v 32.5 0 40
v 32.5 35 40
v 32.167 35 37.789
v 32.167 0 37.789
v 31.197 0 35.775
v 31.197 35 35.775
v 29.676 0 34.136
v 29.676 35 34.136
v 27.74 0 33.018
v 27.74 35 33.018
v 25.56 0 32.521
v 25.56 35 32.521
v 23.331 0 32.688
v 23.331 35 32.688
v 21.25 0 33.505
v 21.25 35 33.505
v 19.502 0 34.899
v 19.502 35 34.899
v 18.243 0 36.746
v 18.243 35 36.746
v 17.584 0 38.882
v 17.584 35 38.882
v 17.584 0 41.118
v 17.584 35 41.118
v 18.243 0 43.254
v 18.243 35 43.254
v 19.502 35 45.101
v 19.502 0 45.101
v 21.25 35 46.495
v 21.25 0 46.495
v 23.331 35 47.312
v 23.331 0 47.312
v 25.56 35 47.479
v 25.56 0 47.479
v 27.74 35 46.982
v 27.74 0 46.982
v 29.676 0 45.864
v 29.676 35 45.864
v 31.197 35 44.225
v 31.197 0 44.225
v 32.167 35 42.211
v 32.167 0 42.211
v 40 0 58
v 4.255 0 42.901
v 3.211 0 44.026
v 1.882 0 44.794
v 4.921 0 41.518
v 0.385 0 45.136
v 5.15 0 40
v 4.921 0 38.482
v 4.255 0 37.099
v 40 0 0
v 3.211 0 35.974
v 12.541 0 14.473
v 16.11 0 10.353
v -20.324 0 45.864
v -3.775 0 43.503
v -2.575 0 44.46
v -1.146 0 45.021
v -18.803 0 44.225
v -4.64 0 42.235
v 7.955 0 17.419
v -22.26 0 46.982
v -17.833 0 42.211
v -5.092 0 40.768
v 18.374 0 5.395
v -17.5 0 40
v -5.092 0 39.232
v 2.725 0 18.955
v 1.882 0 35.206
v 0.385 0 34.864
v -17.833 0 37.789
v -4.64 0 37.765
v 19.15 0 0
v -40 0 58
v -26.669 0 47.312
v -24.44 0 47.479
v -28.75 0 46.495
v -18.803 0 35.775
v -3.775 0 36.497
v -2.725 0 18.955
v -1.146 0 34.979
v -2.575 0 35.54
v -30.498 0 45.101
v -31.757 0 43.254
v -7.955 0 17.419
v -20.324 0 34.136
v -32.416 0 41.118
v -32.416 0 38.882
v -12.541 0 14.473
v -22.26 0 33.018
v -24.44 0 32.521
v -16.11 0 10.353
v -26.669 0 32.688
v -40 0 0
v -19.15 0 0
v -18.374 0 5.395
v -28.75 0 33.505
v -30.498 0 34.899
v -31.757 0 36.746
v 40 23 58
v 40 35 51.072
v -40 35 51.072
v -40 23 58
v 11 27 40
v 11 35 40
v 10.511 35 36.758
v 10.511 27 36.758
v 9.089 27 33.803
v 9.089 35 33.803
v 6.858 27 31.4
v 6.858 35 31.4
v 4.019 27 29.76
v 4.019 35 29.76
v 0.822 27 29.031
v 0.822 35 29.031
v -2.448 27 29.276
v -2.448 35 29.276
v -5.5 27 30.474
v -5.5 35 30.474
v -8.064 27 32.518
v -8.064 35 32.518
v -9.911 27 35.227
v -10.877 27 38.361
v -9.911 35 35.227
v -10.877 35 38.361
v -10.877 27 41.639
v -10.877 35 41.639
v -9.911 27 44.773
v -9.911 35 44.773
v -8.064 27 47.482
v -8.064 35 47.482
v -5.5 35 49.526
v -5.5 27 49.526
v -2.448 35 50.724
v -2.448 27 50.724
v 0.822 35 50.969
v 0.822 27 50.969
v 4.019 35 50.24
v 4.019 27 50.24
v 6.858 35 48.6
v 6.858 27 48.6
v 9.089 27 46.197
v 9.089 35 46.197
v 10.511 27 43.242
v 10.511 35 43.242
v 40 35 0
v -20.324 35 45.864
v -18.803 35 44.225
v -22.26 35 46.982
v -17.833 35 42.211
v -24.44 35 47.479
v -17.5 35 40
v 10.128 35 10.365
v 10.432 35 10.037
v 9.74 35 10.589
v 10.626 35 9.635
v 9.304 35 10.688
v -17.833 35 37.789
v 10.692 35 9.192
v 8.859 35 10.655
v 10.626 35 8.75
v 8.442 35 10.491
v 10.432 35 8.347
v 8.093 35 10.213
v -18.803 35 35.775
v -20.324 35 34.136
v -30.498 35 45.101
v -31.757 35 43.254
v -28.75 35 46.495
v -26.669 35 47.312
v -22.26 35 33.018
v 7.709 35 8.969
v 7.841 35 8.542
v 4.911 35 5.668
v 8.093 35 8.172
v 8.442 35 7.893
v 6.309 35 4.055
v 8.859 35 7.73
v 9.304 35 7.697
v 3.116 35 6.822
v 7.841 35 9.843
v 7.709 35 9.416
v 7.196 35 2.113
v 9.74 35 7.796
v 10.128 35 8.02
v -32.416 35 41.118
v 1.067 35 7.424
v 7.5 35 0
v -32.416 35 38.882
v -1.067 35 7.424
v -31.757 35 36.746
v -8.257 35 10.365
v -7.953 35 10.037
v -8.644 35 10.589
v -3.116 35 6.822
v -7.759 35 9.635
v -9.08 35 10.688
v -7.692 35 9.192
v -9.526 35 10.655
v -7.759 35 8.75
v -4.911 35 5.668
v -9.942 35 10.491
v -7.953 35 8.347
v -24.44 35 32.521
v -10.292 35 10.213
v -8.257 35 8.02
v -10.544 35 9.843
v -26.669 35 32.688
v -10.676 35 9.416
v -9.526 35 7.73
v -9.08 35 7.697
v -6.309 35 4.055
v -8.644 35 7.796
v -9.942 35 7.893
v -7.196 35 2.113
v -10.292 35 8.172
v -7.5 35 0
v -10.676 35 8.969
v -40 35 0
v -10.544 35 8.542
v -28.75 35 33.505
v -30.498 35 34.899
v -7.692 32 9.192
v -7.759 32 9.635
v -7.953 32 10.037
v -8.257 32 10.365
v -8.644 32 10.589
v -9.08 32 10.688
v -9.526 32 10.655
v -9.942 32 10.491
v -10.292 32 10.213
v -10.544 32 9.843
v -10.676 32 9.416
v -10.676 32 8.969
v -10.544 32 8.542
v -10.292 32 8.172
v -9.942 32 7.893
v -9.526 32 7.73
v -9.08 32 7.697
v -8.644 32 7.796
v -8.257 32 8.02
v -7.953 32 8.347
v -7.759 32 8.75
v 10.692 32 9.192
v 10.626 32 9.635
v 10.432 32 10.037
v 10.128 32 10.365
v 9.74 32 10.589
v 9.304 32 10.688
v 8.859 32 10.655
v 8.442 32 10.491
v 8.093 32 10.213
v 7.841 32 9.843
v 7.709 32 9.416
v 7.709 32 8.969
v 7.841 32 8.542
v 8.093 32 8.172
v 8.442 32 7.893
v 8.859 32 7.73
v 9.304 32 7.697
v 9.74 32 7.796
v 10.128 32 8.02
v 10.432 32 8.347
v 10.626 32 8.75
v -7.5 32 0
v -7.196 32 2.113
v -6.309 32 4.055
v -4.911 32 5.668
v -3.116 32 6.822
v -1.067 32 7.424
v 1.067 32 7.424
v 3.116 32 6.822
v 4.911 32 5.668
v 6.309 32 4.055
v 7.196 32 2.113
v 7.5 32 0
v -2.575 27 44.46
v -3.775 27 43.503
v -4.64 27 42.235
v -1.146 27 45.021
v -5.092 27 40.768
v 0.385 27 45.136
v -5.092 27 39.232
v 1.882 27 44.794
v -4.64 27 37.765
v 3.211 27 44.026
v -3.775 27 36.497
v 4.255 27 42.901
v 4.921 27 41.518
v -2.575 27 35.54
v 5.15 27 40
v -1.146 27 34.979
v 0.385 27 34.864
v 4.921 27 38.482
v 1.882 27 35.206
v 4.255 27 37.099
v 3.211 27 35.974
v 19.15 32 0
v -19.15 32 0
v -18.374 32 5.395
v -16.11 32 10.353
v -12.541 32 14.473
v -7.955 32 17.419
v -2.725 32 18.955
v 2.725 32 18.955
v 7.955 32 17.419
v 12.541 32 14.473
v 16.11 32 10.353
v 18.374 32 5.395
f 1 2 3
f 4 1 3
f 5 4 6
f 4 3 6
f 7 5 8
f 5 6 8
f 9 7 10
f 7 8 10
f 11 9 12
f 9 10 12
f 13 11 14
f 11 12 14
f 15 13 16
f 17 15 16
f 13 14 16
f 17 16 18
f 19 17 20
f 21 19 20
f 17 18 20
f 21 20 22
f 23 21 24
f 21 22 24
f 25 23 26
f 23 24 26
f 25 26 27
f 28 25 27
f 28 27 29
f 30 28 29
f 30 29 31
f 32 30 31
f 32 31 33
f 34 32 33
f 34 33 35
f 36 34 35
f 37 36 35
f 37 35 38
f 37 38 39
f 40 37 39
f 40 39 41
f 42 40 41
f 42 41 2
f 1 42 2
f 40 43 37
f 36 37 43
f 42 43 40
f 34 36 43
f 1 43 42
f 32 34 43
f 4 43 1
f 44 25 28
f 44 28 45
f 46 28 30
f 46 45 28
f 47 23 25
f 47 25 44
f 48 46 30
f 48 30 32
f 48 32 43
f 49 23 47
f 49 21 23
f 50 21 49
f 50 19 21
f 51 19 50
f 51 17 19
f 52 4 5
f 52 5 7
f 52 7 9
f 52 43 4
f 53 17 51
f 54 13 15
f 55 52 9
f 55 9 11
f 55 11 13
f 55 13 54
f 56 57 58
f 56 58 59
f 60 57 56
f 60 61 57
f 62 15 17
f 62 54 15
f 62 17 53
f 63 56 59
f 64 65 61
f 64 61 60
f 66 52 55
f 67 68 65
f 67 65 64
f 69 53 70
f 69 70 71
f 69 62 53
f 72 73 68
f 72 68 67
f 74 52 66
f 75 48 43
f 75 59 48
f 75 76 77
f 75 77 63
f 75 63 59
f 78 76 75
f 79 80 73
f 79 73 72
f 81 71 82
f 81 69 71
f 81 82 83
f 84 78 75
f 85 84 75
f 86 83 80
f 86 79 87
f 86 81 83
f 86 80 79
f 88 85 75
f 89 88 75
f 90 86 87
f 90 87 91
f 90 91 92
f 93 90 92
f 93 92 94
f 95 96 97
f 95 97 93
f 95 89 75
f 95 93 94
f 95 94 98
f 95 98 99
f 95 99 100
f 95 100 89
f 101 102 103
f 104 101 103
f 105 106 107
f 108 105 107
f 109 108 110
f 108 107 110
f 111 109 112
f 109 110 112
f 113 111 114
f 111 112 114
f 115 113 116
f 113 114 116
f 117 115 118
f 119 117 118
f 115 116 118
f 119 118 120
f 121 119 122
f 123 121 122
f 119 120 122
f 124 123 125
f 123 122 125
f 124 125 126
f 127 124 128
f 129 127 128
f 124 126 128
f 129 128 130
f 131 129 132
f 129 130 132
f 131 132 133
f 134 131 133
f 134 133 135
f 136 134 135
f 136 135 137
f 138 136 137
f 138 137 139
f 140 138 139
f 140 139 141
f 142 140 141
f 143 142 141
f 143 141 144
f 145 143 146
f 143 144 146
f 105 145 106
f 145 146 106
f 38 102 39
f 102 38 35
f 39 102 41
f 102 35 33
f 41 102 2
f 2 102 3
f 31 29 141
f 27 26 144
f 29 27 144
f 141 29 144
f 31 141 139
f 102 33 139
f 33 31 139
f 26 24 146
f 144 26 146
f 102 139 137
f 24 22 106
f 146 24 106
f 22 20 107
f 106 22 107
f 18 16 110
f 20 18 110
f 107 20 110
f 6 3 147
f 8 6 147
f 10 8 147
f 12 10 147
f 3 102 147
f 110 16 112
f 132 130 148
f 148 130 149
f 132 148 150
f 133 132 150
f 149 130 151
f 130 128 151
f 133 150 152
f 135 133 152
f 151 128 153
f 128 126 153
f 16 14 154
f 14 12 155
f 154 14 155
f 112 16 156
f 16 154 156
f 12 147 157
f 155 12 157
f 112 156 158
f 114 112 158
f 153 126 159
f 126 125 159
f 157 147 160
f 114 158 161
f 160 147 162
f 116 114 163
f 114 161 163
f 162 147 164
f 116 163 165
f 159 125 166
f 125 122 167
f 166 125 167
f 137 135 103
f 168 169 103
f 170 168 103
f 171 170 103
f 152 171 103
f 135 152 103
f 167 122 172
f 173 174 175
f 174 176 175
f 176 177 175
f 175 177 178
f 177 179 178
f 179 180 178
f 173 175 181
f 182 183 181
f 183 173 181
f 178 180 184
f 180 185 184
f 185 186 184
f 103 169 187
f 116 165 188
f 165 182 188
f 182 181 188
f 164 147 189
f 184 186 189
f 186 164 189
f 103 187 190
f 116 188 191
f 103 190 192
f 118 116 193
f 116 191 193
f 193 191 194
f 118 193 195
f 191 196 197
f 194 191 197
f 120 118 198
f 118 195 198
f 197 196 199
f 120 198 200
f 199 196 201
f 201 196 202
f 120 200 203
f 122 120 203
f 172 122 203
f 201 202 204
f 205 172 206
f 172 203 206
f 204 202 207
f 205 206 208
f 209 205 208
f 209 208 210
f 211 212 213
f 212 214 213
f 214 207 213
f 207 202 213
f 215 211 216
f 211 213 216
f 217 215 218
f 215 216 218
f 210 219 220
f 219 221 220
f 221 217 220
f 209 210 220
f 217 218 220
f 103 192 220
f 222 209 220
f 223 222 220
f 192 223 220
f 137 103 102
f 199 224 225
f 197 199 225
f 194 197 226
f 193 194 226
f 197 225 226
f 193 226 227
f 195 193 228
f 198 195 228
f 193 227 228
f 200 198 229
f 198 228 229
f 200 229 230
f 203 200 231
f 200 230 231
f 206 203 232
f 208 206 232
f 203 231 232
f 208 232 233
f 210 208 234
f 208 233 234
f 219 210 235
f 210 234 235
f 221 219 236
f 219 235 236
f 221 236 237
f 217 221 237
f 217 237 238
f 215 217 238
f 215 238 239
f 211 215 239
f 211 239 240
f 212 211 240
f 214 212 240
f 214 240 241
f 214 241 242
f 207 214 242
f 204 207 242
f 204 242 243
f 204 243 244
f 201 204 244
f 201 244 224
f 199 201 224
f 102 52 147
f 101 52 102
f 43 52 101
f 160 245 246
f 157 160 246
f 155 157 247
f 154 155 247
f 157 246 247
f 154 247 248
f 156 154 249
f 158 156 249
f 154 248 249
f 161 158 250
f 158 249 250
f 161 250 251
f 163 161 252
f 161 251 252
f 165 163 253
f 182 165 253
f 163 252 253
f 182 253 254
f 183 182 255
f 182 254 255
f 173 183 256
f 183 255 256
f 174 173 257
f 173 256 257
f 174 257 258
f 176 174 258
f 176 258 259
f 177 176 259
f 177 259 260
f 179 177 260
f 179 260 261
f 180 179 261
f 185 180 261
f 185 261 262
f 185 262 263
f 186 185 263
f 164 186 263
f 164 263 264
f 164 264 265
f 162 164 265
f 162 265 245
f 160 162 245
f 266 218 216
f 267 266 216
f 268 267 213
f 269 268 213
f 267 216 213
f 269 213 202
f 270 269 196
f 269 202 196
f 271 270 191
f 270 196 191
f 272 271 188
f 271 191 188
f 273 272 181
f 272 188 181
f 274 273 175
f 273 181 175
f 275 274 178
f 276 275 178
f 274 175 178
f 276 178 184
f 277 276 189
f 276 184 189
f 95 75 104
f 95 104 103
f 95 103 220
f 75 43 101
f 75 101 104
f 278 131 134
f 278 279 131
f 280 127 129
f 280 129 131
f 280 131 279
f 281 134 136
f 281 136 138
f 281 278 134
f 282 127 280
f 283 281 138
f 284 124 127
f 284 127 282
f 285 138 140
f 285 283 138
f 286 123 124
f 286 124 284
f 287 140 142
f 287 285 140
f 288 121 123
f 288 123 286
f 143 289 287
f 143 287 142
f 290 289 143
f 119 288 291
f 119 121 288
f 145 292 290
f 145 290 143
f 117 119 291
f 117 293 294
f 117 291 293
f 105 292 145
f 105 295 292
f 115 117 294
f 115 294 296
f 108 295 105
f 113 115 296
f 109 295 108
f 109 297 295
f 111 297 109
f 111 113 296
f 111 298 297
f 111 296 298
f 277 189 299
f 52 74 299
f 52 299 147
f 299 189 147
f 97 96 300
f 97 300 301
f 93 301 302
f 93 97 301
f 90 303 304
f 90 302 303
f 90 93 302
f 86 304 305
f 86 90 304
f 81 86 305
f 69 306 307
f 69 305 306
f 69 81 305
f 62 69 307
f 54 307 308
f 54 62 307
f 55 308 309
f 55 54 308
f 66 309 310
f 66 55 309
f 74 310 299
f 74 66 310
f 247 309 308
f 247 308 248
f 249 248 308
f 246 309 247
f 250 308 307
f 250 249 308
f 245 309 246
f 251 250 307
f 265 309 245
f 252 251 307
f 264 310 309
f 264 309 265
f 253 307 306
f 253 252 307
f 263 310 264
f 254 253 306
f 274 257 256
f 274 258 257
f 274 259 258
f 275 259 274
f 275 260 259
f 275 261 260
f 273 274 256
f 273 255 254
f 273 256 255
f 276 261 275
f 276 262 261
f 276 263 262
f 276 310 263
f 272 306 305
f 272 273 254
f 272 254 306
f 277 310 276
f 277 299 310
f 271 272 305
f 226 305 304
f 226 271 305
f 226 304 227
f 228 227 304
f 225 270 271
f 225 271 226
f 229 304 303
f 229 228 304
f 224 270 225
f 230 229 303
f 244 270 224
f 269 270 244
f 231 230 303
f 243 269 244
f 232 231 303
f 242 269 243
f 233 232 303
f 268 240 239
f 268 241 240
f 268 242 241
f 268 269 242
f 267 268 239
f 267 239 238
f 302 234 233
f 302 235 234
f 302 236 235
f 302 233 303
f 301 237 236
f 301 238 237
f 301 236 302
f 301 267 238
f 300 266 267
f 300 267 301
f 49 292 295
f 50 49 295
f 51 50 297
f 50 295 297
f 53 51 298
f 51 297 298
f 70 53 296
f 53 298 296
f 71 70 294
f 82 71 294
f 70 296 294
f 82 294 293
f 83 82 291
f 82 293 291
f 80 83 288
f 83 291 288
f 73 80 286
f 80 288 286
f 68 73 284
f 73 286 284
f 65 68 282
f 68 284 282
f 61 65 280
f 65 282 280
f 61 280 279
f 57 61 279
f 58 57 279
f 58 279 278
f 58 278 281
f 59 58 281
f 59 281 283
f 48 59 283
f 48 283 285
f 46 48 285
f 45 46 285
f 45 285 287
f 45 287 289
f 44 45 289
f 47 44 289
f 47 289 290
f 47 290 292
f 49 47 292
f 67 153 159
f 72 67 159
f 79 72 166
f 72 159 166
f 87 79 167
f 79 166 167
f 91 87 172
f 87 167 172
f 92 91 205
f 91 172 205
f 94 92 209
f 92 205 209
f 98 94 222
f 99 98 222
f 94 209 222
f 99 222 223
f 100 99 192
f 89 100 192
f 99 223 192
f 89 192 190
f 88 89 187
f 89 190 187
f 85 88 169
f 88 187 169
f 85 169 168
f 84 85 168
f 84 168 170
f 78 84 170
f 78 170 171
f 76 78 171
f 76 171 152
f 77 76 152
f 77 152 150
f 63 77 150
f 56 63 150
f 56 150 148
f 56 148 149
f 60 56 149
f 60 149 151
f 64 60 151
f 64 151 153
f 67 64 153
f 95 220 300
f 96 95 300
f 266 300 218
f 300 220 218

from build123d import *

# Parameters (mm, degrees)
BOSS_EXTRUDE1_DEPTH = 35
SKETCH2_R           = 7.5
SKETCH2_R_2         = 5.15
CUT_EXTRUDE1_DEPTH  = 36
BOSS_EXTRUDE2_DEPTH = 3
SKETCH6_R           = 1.5
CUT_EXTRUDE3_DEPTH  = 4
CHAMFER1_SIZE       = 12
CHAMFER1_SIZE2      = 6.92820323
SKETCH7_R           = 11
CUT_EXTRUDE4_DEPTH  = 8


with BuildPart() as part:
    # Sketch1 → Boss-Extrude1 (new body)
    with BuildSketch(Plane(origin=(0, 0, 0), x_dir=(1, 0, 0), z_dir=(0, 1, 0))):
        with BuildLine():
            Line((19.15, 0), (40, 0))
            Line((40, 0), (40, -58))
            Line((40, -58), (-40, -58))
            Line((-40, -58), (-40, 0))
            Line((-40, 0), (-19.15, 0))
            ThreePointArc((-19.15, 0), (0, -19.15), (19.15, 0))
        make_face()
    extrude(amount=BOSS_EXTRUDE1_DEPTH)

    # Sketch2 → Cut-Extrude1 (cut, through all)
    with BuildSketch(Plane(origin=(0, 35, 0), x_dir=(1, 0, 0), z_dir=(0, 1, 0))):
        with Locations((-25, -40)):
            Circle(SKETCH2_R)
        with Locations((25, -40)):
            Circle(SKETCH2_R)
        with Locations((0, -40)):
            Circle(SKETCH2_R_2)
    extrude(amount=-CUT_EXTRUDE1_DEPTH, mode=Mode.SUBTRACT)

    # Sketch5 → Boss-Extrude2 (add)
    with BuildSketch(Plane(origin=(0, 35, 0), x_dir=(1, 0, 0), z_dir=(0, 1, 0))):
        with BuildLine():
            Line((-19.15, 0), (-7.5, 0))
            ThreePointArc((-7.5, 0), (0, -7.5), (7.5, 0))
            Line((7.5, 0), (19.15, 0))
            ThreePointArc((19.15, 0), (0, -19.15), (-19.15, 0))
        make_face()
    extrude(amount=-BOSS_EXTRUDE2_DEPTH)

    # Sketch6 → Cut-Extrude3 (cut, through all)
    with BuildSketch(Plane.XZ.offset(-32)):
        with Locations((9.192388155, 9.192388155)):
            Circle(SKETCH6_R)
        with Locations((-9.192388155, 9.192388155)):
            Circle(SKETCH6_R)
    extrude(amount=-CUT_EXTRUDE3_DEPTH, mode=Mode.SUBTRACT)

    # Chamfer1
    chamfer1_edges = [part.edges().sort_by_distance(p)[0] for p in [
        (0, 35, 58),
    ]]
    chamfer1_side = [part.faces().sort_by_distance(p)[0] for p in [
        (0, 17.5, 58),
    ]]
    chamfer(chamfer1_edges, length=CHAMFER1_SIZE, length2=CHAMFER1_SIZE2, reference=chamfer1_side[0])

    # Sketch7 → Cut-Extrude4 (cut)
    with BuildSketch(Plane(origin=(0, 35, 0), x_dir=(1, 0, 0), z_dir=(0, 1, 0))):
        with Locations((0, -40)):
            Circle(SKETCH7_R)
    extrude(amount=-CUT_EXTRUDE4_DEPTH, mode=Mode.SUBTRACT)


solid = part.part
